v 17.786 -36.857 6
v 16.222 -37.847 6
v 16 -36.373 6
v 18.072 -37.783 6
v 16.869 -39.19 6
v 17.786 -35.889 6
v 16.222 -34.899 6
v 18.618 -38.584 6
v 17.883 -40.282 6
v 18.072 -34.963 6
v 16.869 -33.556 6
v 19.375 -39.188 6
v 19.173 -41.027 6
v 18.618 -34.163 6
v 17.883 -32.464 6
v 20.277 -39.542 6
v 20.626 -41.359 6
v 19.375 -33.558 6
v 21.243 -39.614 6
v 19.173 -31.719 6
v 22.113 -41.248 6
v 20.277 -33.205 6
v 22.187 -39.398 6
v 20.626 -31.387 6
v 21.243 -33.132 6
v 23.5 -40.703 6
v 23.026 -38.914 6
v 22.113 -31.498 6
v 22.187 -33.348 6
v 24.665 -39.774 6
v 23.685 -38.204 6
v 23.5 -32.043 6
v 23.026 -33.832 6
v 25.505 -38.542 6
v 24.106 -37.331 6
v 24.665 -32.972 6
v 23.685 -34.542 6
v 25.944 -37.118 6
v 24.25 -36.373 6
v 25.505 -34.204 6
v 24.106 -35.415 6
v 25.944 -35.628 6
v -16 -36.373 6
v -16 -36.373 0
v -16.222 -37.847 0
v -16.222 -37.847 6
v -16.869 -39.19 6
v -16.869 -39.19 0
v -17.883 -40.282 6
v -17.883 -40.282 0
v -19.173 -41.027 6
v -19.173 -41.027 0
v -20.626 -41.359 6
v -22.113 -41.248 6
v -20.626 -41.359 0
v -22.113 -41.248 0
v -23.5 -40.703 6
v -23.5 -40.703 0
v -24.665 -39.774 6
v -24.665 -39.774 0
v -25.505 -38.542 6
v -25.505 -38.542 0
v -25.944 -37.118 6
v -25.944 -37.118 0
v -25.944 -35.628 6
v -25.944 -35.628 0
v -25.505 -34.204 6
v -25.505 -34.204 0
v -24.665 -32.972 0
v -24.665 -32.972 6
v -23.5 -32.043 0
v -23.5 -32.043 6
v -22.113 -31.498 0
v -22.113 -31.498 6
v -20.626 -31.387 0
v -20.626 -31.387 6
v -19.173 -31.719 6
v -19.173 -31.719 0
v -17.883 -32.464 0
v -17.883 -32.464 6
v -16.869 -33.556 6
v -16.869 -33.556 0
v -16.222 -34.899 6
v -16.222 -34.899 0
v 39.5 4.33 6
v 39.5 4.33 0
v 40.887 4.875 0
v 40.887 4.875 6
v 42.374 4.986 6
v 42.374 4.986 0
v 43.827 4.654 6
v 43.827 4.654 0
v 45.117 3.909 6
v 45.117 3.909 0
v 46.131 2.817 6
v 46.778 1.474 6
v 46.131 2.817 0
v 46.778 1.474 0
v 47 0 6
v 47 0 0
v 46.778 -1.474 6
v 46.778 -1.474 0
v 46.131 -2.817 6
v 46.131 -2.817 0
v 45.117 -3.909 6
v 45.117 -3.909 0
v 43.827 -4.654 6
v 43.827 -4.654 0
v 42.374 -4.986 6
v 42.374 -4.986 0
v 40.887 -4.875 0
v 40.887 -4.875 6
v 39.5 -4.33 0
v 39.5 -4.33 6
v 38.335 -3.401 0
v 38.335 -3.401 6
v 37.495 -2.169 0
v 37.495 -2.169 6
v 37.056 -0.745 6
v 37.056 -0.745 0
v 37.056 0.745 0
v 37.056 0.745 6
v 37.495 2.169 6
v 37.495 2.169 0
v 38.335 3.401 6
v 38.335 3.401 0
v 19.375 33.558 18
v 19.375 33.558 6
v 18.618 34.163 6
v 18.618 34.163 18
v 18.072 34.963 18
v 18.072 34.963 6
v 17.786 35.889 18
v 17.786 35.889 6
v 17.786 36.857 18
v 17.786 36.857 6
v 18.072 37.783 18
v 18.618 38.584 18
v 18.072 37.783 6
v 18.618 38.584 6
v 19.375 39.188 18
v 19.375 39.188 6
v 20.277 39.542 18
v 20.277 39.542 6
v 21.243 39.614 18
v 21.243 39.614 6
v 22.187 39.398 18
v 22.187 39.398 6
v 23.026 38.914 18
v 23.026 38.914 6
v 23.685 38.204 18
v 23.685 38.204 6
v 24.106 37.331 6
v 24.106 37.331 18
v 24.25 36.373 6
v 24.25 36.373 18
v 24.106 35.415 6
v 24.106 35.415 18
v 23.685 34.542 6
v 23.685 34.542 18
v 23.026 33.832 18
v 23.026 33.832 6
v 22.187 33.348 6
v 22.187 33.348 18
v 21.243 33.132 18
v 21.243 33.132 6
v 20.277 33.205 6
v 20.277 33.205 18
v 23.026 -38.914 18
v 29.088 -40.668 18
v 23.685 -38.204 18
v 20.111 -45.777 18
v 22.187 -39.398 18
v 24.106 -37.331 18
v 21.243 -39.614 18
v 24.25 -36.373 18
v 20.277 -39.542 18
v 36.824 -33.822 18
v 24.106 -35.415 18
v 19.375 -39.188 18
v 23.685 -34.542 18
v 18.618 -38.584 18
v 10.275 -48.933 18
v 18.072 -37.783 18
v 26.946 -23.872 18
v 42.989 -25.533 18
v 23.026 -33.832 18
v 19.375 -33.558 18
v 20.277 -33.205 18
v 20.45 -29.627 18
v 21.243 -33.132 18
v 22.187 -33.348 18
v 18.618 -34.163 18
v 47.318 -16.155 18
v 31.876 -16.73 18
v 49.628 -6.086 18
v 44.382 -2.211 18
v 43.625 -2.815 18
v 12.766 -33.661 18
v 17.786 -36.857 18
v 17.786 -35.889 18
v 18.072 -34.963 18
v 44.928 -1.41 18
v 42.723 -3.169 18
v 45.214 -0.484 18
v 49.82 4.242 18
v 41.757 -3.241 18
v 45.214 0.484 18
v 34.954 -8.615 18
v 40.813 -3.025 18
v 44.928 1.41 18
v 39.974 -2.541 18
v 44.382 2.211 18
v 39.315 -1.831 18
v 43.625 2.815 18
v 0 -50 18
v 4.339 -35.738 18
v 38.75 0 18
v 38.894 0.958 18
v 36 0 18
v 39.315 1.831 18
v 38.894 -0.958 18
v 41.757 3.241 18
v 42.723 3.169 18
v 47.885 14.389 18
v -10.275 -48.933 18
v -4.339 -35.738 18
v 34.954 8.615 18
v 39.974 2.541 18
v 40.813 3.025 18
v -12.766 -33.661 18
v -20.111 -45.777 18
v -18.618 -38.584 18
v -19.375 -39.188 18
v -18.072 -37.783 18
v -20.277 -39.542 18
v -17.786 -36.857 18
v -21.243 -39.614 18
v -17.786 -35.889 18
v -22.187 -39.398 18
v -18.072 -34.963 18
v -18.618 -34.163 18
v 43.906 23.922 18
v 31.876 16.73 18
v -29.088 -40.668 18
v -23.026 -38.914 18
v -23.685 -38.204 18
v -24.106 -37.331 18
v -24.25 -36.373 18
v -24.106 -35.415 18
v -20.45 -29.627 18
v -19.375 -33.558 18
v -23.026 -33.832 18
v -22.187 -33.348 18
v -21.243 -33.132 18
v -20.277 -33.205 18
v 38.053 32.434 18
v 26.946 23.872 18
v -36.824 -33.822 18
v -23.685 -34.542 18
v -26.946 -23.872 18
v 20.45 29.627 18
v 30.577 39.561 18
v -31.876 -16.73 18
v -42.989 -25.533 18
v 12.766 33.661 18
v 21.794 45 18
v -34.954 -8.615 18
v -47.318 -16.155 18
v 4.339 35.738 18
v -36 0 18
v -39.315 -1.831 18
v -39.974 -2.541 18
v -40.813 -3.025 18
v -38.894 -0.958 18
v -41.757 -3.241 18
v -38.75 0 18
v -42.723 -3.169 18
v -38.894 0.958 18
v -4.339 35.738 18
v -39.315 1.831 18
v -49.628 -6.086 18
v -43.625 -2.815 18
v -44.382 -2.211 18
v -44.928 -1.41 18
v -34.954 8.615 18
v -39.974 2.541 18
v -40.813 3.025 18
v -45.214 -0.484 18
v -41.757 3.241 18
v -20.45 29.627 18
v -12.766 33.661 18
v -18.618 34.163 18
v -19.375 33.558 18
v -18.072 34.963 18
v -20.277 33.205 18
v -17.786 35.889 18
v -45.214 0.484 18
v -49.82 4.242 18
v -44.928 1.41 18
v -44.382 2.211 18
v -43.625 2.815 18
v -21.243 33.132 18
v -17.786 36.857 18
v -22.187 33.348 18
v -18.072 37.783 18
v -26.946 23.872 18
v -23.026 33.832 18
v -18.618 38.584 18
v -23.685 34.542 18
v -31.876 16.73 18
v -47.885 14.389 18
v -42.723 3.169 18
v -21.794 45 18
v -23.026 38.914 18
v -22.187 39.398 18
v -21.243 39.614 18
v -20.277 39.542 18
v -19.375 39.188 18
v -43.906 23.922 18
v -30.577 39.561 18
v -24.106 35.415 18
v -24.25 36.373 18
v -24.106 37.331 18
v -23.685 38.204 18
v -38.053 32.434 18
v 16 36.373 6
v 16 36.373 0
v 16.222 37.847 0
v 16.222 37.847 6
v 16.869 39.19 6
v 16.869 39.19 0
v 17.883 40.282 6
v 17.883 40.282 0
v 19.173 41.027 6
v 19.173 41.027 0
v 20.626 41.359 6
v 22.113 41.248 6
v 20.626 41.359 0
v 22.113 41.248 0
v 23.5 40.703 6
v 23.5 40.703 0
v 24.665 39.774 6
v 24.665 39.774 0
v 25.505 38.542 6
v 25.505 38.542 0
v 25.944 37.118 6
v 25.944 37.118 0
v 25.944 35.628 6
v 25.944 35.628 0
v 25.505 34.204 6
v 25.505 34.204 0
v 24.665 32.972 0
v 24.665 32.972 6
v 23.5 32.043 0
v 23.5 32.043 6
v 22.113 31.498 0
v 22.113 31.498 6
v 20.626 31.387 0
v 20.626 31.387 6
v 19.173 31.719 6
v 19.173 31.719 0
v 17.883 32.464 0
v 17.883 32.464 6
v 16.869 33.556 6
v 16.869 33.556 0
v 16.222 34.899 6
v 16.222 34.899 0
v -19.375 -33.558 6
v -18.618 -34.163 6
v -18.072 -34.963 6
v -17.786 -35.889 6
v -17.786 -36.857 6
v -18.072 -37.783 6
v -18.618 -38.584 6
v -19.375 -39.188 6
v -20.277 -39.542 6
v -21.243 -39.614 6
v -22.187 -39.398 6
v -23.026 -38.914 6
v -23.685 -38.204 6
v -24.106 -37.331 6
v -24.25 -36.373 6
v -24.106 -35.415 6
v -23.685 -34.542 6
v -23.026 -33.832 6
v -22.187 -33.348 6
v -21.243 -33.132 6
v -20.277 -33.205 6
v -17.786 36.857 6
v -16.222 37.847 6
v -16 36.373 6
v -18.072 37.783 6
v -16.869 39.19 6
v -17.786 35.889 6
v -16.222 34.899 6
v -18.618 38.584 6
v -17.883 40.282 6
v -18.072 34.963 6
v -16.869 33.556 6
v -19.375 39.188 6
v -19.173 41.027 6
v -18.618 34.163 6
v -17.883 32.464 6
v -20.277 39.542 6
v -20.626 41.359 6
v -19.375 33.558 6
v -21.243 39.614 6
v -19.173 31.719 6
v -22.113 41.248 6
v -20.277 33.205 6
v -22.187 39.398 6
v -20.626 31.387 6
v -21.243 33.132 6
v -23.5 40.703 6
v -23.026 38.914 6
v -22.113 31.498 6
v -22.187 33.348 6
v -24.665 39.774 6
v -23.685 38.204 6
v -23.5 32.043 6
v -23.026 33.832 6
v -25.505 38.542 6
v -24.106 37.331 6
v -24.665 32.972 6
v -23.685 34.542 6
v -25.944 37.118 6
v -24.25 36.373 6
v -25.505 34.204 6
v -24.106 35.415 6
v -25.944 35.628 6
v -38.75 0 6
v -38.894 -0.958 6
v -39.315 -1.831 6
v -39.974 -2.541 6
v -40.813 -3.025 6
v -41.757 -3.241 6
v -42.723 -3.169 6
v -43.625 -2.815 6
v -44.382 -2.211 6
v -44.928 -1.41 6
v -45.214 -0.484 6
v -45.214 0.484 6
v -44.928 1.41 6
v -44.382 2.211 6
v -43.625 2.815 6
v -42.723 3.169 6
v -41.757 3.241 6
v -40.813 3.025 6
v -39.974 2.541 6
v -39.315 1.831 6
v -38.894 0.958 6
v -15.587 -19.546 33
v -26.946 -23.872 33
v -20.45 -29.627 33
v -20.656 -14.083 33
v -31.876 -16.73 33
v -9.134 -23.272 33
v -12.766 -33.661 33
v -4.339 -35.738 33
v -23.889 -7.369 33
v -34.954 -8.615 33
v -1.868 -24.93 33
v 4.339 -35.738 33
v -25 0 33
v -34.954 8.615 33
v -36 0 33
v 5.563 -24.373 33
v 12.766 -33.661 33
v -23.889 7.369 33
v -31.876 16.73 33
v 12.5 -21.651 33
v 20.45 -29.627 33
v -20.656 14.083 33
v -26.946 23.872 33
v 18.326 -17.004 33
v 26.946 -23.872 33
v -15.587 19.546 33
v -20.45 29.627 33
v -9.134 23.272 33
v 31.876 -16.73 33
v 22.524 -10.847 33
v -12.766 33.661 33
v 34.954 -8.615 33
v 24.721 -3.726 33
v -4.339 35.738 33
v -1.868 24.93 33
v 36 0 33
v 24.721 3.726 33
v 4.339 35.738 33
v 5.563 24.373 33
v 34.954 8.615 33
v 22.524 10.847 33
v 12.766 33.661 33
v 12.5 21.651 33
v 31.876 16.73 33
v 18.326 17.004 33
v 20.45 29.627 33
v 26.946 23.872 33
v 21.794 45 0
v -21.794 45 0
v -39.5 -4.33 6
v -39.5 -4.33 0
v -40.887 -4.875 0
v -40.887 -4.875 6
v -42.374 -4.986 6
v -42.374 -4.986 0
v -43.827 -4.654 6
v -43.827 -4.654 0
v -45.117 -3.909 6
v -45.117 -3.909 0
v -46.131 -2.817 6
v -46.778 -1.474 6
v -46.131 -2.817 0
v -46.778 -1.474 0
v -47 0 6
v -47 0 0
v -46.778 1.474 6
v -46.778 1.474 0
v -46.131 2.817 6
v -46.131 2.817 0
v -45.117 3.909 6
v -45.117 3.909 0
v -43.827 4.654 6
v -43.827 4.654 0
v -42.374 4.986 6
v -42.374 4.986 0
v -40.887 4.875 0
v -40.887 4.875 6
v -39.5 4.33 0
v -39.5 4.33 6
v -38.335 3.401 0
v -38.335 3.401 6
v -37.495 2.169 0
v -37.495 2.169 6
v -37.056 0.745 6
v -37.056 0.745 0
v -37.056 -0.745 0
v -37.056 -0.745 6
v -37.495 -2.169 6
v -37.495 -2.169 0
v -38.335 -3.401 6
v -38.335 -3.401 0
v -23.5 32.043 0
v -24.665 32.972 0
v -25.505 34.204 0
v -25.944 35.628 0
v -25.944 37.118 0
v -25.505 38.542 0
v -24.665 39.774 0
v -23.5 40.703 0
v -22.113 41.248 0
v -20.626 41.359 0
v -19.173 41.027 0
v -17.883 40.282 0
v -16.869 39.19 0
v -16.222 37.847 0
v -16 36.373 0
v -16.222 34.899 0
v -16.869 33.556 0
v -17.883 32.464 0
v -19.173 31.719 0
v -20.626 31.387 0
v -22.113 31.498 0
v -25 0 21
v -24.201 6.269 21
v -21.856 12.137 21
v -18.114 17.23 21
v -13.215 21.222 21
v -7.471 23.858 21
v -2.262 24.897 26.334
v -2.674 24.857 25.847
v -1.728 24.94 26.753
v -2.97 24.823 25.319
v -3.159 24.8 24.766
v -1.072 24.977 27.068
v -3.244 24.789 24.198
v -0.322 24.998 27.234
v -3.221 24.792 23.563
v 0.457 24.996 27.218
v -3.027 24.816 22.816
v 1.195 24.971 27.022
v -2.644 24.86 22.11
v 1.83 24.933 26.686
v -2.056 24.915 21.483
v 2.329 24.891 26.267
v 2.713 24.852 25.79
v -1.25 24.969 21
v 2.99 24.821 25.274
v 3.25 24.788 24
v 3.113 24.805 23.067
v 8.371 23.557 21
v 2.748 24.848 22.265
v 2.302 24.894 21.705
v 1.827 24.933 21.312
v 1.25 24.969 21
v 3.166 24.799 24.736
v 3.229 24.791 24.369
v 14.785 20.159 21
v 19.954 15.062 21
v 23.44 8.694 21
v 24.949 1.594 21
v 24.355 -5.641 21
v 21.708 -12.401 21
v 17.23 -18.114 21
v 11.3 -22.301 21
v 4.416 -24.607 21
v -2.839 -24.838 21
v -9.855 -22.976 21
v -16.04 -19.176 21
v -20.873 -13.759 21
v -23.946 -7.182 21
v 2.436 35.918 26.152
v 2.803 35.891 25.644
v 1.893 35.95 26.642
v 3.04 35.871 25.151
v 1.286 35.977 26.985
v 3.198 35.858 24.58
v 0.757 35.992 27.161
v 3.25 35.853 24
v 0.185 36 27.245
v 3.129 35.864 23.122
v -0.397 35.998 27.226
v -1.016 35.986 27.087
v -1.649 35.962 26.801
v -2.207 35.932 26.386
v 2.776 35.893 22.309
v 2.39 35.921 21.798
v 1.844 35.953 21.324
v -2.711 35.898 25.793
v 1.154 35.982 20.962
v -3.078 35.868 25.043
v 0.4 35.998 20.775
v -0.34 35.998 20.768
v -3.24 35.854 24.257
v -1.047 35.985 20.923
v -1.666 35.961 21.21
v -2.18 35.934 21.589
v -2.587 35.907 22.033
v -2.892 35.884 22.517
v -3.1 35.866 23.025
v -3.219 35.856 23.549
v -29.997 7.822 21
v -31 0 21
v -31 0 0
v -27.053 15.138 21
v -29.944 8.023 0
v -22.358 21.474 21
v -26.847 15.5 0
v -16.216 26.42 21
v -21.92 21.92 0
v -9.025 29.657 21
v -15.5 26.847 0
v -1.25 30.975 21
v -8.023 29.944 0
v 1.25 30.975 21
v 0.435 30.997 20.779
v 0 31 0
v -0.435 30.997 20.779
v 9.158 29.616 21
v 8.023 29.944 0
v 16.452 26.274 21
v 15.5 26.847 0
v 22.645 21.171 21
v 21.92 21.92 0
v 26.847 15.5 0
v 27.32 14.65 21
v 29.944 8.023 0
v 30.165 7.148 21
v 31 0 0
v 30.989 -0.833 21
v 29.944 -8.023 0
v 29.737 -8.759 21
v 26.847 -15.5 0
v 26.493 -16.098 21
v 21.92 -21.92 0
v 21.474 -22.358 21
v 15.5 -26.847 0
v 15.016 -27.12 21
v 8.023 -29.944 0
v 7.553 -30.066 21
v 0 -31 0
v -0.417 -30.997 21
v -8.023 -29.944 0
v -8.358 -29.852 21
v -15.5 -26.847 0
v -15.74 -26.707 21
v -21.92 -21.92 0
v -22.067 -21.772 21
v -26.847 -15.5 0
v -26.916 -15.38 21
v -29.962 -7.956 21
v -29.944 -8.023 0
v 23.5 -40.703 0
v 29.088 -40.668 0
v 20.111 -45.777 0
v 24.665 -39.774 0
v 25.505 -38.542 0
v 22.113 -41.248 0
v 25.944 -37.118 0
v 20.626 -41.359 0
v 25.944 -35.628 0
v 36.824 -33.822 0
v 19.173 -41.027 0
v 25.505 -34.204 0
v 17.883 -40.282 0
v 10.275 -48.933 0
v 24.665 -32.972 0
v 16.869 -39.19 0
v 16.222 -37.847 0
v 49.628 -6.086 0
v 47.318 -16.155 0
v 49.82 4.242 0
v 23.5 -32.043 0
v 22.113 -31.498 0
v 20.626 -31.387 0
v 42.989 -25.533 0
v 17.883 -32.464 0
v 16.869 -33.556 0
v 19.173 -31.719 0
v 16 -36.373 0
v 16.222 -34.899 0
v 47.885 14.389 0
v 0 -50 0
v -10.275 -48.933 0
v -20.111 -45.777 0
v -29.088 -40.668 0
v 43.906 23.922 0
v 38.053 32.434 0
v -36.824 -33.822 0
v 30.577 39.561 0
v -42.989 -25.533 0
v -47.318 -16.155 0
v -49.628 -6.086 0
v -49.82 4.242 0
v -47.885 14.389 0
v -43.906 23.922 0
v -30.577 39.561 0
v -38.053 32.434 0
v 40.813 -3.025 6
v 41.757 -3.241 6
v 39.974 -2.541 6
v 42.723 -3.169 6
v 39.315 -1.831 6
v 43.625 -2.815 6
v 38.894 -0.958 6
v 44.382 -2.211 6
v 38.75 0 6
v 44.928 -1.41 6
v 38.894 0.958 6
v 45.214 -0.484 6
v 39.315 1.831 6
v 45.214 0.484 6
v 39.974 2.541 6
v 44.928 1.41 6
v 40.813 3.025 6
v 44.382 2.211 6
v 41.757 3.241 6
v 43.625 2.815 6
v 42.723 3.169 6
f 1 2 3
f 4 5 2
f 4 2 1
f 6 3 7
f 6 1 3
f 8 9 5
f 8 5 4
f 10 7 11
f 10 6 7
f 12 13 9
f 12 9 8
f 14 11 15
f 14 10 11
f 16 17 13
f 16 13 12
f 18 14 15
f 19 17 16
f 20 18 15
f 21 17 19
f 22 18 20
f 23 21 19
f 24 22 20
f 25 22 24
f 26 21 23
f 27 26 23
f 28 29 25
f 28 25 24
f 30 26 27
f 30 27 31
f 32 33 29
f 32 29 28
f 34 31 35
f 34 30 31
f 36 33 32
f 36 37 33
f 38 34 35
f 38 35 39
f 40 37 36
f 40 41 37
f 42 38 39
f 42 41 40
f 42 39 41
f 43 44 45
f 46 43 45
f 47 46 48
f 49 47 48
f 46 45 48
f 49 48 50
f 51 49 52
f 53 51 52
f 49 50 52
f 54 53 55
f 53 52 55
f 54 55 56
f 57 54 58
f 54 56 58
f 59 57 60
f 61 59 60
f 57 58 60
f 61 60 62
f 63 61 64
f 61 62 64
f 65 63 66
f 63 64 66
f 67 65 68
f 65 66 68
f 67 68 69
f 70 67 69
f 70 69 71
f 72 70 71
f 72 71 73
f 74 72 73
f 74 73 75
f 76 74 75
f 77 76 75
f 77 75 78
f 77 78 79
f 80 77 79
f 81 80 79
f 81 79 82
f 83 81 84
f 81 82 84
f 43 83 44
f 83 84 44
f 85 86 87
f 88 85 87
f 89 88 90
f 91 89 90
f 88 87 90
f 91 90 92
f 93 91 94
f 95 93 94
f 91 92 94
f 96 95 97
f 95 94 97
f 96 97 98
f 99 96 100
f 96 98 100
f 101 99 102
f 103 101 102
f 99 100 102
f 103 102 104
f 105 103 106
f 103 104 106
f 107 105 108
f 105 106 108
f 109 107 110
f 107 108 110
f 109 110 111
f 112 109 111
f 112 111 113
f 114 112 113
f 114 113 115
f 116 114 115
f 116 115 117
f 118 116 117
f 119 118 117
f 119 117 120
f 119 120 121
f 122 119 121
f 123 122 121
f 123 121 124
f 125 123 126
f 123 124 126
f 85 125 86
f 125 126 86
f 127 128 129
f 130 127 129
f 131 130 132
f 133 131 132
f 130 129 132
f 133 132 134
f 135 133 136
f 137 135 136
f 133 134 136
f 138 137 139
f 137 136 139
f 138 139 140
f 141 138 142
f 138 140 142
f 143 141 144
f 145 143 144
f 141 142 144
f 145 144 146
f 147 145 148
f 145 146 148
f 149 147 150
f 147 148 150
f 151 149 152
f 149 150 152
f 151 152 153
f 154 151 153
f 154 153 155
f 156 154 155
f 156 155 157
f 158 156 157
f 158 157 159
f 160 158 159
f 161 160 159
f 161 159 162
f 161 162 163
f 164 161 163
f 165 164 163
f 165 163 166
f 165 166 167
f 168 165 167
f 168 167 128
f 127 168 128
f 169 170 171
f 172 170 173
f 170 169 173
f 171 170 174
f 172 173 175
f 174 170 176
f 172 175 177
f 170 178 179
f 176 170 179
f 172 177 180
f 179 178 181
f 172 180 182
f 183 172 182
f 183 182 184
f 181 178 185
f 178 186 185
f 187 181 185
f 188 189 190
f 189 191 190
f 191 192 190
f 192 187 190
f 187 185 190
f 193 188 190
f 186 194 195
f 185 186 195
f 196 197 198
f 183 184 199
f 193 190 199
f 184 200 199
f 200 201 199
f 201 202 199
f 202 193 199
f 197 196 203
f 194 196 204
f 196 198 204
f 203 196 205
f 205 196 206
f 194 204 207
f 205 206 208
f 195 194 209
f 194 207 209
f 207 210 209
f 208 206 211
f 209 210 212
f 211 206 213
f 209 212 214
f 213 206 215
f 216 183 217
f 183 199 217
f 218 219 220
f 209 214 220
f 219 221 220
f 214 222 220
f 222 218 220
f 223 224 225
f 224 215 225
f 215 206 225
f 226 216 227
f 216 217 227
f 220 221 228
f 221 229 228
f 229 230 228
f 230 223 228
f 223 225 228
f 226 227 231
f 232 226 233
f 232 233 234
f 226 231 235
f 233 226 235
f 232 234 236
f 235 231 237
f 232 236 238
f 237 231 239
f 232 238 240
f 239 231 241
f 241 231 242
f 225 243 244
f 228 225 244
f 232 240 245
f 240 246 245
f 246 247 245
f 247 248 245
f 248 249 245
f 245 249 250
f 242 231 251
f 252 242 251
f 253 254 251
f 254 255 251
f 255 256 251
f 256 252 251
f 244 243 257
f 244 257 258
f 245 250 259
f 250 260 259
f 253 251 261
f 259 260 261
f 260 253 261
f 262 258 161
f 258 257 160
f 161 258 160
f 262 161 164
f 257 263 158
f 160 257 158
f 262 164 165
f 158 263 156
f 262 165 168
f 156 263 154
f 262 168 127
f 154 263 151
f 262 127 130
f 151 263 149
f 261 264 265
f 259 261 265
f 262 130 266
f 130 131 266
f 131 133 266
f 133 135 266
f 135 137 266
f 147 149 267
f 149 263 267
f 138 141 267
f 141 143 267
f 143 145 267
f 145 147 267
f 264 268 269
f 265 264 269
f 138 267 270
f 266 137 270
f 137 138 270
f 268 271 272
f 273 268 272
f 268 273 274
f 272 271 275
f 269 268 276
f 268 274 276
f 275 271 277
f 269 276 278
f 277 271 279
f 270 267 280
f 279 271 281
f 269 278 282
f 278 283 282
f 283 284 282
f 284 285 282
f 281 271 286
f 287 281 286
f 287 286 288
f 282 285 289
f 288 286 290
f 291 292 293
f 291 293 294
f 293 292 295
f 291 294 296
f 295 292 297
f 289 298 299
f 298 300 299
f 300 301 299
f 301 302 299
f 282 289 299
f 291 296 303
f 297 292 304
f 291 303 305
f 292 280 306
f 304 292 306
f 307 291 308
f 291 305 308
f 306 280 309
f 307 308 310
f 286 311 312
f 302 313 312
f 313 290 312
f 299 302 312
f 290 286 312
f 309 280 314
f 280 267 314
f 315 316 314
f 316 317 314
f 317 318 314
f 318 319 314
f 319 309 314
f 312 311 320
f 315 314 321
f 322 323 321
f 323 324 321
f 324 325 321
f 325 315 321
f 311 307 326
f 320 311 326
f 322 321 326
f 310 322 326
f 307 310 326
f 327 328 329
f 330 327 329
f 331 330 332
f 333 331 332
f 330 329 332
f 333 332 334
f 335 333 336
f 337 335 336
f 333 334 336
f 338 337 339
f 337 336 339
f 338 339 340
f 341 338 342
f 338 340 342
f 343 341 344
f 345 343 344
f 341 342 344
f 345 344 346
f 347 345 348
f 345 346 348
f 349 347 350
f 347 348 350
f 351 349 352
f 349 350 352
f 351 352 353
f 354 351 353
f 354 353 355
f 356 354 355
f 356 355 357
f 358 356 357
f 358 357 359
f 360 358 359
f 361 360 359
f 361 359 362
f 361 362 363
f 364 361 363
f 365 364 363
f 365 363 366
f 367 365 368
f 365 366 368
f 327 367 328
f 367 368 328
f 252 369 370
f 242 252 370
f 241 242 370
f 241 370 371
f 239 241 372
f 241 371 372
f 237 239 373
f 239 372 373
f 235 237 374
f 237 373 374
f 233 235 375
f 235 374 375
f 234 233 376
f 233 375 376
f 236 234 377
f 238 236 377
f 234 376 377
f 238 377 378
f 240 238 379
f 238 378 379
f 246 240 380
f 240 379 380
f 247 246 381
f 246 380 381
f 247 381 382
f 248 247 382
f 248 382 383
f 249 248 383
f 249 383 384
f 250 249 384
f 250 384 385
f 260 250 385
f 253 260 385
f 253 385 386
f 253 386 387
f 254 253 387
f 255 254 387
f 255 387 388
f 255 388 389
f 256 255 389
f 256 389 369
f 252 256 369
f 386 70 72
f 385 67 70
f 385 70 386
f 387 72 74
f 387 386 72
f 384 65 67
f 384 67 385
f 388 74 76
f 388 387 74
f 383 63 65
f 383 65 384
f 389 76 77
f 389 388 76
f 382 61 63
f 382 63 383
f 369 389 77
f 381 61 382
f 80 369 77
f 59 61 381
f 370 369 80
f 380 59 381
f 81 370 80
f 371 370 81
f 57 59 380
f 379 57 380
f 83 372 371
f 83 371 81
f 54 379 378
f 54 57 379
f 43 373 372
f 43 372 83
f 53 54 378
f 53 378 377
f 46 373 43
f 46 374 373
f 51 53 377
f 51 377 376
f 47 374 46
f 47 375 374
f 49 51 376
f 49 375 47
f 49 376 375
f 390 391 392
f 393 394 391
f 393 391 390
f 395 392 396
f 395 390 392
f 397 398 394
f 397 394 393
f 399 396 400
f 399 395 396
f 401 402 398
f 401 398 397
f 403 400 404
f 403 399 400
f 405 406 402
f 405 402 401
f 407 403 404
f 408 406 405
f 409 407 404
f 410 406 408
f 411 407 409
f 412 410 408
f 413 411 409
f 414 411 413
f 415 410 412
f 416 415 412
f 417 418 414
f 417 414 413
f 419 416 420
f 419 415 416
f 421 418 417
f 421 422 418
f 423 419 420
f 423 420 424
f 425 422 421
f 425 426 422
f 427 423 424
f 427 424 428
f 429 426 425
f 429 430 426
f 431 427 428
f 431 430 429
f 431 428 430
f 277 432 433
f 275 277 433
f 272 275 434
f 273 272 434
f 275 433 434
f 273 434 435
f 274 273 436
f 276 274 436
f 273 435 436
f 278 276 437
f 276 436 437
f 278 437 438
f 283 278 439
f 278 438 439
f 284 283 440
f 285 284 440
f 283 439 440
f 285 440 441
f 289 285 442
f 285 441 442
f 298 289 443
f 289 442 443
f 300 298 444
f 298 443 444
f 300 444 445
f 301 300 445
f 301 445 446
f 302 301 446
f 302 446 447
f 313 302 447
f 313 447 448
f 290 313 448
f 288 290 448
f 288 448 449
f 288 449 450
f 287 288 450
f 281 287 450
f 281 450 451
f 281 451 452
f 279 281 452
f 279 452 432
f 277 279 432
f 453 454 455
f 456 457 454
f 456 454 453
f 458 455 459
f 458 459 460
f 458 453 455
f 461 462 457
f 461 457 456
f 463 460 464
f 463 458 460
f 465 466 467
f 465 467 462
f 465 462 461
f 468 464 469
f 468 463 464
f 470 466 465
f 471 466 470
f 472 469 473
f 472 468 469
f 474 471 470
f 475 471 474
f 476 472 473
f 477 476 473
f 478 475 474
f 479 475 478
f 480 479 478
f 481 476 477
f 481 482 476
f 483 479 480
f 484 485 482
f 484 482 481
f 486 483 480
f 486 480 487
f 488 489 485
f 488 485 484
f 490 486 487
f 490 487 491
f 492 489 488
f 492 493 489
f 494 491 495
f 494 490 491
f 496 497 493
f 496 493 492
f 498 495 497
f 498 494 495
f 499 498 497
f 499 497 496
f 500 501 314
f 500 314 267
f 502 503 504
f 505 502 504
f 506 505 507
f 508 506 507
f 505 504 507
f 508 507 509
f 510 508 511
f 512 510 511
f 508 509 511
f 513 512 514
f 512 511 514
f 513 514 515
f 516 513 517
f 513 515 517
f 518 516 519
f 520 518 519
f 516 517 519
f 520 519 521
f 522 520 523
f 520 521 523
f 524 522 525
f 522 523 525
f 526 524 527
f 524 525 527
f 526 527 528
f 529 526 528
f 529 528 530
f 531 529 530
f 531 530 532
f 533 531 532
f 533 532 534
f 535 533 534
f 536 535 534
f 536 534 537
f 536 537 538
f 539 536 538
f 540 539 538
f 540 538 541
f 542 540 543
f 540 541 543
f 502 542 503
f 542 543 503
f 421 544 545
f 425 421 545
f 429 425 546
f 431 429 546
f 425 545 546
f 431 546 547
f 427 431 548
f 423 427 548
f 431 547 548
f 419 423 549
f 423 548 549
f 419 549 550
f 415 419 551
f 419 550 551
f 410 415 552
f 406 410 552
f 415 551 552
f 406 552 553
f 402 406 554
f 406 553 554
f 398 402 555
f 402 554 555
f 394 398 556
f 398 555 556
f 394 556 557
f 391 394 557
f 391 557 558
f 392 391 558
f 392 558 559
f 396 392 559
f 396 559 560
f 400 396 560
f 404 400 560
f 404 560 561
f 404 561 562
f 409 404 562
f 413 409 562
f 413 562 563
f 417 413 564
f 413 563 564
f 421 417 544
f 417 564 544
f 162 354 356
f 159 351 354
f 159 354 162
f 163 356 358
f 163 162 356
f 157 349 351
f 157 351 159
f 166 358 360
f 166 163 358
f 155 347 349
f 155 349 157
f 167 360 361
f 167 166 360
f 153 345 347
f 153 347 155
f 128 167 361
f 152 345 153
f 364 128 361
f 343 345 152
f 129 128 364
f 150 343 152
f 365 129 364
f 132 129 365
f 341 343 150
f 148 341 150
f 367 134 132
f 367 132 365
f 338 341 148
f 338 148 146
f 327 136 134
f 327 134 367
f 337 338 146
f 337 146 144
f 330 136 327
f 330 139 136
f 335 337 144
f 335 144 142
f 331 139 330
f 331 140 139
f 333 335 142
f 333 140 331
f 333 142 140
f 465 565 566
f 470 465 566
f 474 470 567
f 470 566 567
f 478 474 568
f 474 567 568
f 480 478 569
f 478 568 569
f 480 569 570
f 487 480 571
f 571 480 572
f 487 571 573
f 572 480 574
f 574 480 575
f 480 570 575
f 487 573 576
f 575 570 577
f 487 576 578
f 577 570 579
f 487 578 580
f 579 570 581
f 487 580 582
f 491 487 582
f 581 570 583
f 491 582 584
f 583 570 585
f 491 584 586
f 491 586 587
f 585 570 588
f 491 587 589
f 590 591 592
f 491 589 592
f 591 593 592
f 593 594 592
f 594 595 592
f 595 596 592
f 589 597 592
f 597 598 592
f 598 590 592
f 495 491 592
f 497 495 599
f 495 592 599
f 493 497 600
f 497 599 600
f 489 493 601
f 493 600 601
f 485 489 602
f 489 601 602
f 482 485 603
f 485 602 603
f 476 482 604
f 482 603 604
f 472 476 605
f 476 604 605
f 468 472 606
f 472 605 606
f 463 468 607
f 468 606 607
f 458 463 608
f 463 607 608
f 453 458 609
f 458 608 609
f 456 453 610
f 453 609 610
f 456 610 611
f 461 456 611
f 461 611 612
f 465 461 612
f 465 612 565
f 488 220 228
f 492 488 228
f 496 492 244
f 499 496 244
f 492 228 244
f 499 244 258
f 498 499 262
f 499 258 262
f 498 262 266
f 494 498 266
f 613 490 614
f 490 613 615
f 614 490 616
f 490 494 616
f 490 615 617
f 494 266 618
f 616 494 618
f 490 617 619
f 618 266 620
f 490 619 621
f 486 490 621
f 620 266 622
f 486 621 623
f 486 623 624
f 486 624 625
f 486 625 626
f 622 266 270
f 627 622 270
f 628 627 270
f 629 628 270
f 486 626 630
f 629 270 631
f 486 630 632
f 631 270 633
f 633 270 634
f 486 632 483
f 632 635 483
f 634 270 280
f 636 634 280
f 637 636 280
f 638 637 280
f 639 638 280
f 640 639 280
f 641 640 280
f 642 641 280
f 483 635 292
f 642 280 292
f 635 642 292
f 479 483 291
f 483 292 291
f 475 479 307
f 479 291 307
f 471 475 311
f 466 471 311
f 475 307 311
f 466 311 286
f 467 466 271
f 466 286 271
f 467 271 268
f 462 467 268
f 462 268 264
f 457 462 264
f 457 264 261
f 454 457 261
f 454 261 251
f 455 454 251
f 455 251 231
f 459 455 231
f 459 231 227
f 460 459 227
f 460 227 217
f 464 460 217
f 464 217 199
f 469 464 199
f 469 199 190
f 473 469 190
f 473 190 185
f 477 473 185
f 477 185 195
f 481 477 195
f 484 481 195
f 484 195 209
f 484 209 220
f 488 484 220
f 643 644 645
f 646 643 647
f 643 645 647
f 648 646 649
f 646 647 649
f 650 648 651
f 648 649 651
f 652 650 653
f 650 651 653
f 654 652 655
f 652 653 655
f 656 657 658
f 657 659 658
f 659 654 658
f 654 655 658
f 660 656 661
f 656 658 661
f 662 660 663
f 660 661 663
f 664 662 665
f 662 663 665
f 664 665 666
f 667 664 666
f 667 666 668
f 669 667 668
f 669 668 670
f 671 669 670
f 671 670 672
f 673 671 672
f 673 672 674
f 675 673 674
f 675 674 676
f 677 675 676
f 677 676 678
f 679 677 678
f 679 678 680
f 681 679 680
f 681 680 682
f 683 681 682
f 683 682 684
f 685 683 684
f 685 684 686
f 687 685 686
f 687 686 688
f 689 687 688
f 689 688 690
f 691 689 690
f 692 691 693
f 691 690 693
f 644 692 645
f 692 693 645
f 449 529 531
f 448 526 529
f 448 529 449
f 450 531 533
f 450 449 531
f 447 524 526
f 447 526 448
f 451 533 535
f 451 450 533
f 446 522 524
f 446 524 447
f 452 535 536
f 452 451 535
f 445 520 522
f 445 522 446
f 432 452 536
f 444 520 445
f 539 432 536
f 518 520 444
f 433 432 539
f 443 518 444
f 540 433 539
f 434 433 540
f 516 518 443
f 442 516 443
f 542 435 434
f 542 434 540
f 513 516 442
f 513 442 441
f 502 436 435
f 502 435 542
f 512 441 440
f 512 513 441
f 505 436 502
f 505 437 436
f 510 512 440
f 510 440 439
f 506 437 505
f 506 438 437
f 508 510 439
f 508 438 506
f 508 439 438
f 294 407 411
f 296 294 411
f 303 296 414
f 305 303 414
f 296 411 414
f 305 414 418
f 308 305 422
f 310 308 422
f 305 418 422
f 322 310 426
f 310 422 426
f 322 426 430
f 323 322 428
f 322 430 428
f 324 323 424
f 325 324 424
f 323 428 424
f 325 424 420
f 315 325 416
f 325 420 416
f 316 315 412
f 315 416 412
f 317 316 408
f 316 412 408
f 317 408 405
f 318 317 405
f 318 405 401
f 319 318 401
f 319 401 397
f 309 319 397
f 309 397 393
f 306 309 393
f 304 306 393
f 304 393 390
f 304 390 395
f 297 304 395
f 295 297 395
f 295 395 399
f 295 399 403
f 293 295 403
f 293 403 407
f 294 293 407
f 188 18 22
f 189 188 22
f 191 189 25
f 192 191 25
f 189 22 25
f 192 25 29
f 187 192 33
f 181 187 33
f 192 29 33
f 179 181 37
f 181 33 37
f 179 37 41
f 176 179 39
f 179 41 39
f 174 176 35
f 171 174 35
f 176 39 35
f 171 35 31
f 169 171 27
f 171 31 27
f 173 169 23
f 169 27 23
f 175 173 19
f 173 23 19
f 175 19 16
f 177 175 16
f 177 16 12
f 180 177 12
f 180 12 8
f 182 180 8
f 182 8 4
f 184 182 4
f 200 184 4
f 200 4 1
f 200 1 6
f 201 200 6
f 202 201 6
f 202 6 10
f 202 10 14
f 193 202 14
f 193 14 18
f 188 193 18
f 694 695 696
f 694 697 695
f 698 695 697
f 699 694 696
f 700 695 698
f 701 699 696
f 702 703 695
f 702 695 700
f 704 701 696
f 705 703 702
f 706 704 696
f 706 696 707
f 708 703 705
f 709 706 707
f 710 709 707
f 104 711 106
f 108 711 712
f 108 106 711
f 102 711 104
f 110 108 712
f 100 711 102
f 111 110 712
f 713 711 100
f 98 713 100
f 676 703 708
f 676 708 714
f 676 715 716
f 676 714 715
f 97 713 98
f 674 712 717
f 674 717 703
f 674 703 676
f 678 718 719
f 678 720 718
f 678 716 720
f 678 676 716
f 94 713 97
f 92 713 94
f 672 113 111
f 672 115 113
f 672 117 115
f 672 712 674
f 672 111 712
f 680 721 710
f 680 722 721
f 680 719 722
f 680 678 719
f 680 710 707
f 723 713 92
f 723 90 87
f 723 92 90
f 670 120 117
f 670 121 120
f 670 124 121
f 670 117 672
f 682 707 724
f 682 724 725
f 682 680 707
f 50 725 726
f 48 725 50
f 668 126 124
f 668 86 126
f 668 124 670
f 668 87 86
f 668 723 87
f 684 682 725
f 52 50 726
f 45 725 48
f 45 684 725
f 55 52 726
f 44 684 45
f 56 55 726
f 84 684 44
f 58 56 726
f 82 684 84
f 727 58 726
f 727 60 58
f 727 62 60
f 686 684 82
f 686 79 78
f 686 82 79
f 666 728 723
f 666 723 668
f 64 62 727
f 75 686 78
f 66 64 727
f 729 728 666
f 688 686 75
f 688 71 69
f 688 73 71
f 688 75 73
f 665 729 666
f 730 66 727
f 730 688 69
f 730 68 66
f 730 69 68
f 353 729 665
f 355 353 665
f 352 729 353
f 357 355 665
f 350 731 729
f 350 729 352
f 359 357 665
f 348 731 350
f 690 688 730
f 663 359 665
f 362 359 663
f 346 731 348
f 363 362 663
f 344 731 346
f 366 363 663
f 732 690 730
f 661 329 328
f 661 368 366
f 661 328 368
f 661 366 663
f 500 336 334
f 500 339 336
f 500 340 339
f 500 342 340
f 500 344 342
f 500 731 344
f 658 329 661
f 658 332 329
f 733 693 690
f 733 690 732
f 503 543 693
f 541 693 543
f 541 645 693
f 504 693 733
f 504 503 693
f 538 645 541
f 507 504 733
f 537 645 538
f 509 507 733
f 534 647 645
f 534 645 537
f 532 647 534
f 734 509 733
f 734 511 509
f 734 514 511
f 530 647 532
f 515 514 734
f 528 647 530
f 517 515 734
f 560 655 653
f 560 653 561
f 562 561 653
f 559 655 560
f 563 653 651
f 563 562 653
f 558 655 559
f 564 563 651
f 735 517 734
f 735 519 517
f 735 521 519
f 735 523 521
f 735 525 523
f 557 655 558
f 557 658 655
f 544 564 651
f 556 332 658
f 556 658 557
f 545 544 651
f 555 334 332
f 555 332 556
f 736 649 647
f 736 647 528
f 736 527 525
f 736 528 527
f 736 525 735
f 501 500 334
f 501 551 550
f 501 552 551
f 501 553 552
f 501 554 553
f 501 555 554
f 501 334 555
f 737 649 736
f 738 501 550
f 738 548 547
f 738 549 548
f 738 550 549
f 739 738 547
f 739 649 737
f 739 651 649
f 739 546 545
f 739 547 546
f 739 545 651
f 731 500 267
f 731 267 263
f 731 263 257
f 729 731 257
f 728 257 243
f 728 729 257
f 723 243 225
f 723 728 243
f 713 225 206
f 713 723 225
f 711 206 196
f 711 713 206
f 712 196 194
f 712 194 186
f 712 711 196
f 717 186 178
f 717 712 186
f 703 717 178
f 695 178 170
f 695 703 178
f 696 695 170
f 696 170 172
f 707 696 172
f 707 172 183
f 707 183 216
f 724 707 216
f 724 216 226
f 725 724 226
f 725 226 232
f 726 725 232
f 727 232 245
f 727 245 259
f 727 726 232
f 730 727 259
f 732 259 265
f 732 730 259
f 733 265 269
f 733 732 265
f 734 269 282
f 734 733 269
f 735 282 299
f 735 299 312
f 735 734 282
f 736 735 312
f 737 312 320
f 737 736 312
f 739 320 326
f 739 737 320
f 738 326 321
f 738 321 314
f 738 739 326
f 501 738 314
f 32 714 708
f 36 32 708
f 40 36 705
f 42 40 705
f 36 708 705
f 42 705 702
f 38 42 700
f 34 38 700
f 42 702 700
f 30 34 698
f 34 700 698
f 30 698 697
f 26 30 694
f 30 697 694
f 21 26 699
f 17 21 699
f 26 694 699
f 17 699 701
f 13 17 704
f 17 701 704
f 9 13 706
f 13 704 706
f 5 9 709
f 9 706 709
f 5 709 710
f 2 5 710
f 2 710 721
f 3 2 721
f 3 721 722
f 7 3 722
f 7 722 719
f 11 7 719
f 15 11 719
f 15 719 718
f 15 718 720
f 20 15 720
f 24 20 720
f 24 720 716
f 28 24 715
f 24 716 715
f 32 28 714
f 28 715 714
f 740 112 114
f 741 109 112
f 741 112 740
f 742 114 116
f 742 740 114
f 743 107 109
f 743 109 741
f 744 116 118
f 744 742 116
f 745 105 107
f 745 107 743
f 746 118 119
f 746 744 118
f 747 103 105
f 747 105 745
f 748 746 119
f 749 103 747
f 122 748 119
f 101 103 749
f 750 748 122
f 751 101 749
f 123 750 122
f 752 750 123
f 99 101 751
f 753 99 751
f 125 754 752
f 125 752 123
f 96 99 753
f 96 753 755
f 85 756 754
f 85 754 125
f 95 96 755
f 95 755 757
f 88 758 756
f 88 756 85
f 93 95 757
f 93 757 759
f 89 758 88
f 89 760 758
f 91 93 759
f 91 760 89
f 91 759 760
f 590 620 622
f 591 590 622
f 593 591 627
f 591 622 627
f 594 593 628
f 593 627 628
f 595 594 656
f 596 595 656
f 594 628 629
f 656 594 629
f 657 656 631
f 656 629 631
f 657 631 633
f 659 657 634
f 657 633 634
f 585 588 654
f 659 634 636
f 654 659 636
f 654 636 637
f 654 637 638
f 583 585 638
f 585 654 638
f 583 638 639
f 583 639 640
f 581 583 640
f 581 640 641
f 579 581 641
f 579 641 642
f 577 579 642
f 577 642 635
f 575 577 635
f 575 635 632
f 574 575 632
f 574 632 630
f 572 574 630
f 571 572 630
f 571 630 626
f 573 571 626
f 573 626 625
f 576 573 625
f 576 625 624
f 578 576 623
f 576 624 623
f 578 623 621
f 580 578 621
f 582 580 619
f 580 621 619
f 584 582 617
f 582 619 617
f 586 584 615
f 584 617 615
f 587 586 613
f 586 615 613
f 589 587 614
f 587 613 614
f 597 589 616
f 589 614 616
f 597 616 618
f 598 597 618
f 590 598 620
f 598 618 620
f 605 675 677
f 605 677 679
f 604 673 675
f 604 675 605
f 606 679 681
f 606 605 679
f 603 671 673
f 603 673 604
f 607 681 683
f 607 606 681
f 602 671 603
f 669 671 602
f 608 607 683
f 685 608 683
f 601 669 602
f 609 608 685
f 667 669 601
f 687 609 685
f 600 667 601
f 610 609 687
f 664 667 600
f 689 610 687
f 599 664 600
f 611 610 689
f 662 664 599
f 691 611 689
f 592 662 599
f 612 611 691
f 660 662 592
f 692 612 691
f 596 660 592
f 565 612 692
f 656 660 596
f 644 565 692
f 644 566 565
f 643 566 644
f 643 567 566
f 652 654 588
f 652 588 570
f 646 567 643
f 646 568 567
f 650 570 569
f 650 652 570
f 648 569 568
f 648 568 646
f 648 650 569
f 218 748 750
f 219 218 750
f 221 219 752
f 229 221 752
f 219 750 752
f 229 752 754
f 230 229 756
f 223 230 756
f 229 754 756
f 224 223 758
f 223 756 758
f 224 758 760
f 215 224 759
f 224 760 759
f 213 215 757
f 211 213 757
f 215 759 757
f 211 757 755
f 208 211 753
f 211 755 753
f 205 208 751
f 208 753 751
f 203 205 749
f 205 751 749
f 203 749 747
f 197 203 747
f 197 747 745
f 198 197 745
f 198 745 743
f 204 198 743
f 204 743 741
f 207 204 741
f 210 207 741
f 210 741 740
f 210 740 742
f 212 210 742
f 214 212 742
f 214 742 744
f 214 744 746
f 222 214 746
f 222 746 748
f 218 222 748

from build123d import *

# Parameters (mm, degrees)
SALIENTE_EXTRUIR1_DEPTH = 18
CROQUIS2_R              = 36
SALIENTE_EXTRUIR2_DEPTH = 15
CROQUIS3_R              = 31
CORTAR_EXTRUIR1_DEPTH   = 21
CROQUIS4_R              = 25
CORTAR_EXTRUIR2_DEPTH   = 21
CROQUIS5_R              = 3.25
CORTAR_EXTRUIR3_DEPTH   = 21
MATRIZC1_COUNT          = 6
CROQUIS6_R              = 5
CORTAR_EXTRUIR4_DEPTH   = 6
MATRIZC2_COUNT          = 6
CROQUIS7_R              = 3.25
CORTAR_EXTRUIR5_DEPTH   = 27


with BuildPart() as part:
    # Croquis1 → Saliente-Extruir1 (new body)
    with BuildSketch(Plane.XY):
        with BuildLine():
            Line((-21.794494718, 45), (21.794494718, 45))
            ThreePointArc((21.794494718, 45), (0, -50), (-21.794494718, 45))
        make_face()
    extrude(amount=SALIENTE_EXTRUIR1_DEPTH)

    # Croquis2 → Saliente-Extruir2 (add)
    with BuildSketch(Plane.XY.offset(18)):
        Circle(CROQUIS2_R)
    extrude(amount=SALIENTE_EXTRUIR2_DEPTH)

    # Croquis3 → Cortar-Extruir1 (cut)
    with BuildSketch(Plane(origin=(0, 0, 0), x_dir=(-1, 0, 0), z_dir=(0, 0, -1))):
        Circle(CROQUIS3_R)
    extrude(amount=-CORTAR_EXTRUIR1_DEPTH, mode=Mode.SUBTRACT)

    # Croquis4 → Cortar-Extruir2 (cut)
    with BuildSketch(Plane(origin=(0, 0, 21), x_dir=(-1, 0, 0), z_dir=(0, 0, -1))):
        Circle(CROQUIS4_R)
    extrude(amount=-CORTAR_EXTRUIR2_DEPTH, mode=Mode.SUBTRACT)

    # Croquis5 → Cortar-Extruir3 (cut)
    with BuildSketch(Plane(origin=(0, 0, 0), x_dir=(-1, 0, 0), z_dir=(0, 0, -1))):
        with Locations((-42, 0)):
            Circle(CROQUIS5_R)
    cortar_extruir3 = extrude(amount=-CORTAR_EXTRUIR3_DEPTH, mode=Mode.SUBTRACT)

    # MatrizC1: Cortar-Extruir3 ×6 about axis
    matrizc1_axis = Axis((0, 0, 0), (0, 0, 1))
    for i in range(1, MATRIZC1_COUNT):
        add(cortar_extruir3.rotate(matrizc1_axis, i * 360 / MATRIZC1_COUNT), mode=Mode.SUBTRACT)

    # Croquis6 → Cortar-Extruir4 (cut)
    with BuildSketch(Plane(origin=(0, 0, 0), x_dir=(-1, 0, 0), z_dir=(0, 0, -1))):
        with Locations((-21, 36.373066959)):
            Circle(CROQUIS6_R)
    cortar_extruir4 = extrude(amount=-CORTAR_EXTRUIR4_DEPTH, mode=Mode.SUBTRACT)

    # MatrizC2: Cortar-Extruir4 ×6 about axis
    matrizc2_axis = Axis((0, 0, 0), (0, 0, 1))
    for i in range(1, MATRIZC2_COUNT):
        add(cortar_extruir4.rotate(matrizc2_axis, i * 360 / MATRIZC2_COUNT), mode=Mode.SUBTRACT)

    # Croquis7 → Cortar-Extruir5 (cut)
    with BuildSketch(Plane(origin=(0, 45, 0), x_dir=(1, 0, 0), z_dir=(0, 1, 0))):
        with Locations((0, -24)):
            Circle(CROQUIS7_R)
    extrude(amount=-CORTAR_EXTRUIR5_DEPTH, mode=Mode.SUBTRACT)


solid = part.part
